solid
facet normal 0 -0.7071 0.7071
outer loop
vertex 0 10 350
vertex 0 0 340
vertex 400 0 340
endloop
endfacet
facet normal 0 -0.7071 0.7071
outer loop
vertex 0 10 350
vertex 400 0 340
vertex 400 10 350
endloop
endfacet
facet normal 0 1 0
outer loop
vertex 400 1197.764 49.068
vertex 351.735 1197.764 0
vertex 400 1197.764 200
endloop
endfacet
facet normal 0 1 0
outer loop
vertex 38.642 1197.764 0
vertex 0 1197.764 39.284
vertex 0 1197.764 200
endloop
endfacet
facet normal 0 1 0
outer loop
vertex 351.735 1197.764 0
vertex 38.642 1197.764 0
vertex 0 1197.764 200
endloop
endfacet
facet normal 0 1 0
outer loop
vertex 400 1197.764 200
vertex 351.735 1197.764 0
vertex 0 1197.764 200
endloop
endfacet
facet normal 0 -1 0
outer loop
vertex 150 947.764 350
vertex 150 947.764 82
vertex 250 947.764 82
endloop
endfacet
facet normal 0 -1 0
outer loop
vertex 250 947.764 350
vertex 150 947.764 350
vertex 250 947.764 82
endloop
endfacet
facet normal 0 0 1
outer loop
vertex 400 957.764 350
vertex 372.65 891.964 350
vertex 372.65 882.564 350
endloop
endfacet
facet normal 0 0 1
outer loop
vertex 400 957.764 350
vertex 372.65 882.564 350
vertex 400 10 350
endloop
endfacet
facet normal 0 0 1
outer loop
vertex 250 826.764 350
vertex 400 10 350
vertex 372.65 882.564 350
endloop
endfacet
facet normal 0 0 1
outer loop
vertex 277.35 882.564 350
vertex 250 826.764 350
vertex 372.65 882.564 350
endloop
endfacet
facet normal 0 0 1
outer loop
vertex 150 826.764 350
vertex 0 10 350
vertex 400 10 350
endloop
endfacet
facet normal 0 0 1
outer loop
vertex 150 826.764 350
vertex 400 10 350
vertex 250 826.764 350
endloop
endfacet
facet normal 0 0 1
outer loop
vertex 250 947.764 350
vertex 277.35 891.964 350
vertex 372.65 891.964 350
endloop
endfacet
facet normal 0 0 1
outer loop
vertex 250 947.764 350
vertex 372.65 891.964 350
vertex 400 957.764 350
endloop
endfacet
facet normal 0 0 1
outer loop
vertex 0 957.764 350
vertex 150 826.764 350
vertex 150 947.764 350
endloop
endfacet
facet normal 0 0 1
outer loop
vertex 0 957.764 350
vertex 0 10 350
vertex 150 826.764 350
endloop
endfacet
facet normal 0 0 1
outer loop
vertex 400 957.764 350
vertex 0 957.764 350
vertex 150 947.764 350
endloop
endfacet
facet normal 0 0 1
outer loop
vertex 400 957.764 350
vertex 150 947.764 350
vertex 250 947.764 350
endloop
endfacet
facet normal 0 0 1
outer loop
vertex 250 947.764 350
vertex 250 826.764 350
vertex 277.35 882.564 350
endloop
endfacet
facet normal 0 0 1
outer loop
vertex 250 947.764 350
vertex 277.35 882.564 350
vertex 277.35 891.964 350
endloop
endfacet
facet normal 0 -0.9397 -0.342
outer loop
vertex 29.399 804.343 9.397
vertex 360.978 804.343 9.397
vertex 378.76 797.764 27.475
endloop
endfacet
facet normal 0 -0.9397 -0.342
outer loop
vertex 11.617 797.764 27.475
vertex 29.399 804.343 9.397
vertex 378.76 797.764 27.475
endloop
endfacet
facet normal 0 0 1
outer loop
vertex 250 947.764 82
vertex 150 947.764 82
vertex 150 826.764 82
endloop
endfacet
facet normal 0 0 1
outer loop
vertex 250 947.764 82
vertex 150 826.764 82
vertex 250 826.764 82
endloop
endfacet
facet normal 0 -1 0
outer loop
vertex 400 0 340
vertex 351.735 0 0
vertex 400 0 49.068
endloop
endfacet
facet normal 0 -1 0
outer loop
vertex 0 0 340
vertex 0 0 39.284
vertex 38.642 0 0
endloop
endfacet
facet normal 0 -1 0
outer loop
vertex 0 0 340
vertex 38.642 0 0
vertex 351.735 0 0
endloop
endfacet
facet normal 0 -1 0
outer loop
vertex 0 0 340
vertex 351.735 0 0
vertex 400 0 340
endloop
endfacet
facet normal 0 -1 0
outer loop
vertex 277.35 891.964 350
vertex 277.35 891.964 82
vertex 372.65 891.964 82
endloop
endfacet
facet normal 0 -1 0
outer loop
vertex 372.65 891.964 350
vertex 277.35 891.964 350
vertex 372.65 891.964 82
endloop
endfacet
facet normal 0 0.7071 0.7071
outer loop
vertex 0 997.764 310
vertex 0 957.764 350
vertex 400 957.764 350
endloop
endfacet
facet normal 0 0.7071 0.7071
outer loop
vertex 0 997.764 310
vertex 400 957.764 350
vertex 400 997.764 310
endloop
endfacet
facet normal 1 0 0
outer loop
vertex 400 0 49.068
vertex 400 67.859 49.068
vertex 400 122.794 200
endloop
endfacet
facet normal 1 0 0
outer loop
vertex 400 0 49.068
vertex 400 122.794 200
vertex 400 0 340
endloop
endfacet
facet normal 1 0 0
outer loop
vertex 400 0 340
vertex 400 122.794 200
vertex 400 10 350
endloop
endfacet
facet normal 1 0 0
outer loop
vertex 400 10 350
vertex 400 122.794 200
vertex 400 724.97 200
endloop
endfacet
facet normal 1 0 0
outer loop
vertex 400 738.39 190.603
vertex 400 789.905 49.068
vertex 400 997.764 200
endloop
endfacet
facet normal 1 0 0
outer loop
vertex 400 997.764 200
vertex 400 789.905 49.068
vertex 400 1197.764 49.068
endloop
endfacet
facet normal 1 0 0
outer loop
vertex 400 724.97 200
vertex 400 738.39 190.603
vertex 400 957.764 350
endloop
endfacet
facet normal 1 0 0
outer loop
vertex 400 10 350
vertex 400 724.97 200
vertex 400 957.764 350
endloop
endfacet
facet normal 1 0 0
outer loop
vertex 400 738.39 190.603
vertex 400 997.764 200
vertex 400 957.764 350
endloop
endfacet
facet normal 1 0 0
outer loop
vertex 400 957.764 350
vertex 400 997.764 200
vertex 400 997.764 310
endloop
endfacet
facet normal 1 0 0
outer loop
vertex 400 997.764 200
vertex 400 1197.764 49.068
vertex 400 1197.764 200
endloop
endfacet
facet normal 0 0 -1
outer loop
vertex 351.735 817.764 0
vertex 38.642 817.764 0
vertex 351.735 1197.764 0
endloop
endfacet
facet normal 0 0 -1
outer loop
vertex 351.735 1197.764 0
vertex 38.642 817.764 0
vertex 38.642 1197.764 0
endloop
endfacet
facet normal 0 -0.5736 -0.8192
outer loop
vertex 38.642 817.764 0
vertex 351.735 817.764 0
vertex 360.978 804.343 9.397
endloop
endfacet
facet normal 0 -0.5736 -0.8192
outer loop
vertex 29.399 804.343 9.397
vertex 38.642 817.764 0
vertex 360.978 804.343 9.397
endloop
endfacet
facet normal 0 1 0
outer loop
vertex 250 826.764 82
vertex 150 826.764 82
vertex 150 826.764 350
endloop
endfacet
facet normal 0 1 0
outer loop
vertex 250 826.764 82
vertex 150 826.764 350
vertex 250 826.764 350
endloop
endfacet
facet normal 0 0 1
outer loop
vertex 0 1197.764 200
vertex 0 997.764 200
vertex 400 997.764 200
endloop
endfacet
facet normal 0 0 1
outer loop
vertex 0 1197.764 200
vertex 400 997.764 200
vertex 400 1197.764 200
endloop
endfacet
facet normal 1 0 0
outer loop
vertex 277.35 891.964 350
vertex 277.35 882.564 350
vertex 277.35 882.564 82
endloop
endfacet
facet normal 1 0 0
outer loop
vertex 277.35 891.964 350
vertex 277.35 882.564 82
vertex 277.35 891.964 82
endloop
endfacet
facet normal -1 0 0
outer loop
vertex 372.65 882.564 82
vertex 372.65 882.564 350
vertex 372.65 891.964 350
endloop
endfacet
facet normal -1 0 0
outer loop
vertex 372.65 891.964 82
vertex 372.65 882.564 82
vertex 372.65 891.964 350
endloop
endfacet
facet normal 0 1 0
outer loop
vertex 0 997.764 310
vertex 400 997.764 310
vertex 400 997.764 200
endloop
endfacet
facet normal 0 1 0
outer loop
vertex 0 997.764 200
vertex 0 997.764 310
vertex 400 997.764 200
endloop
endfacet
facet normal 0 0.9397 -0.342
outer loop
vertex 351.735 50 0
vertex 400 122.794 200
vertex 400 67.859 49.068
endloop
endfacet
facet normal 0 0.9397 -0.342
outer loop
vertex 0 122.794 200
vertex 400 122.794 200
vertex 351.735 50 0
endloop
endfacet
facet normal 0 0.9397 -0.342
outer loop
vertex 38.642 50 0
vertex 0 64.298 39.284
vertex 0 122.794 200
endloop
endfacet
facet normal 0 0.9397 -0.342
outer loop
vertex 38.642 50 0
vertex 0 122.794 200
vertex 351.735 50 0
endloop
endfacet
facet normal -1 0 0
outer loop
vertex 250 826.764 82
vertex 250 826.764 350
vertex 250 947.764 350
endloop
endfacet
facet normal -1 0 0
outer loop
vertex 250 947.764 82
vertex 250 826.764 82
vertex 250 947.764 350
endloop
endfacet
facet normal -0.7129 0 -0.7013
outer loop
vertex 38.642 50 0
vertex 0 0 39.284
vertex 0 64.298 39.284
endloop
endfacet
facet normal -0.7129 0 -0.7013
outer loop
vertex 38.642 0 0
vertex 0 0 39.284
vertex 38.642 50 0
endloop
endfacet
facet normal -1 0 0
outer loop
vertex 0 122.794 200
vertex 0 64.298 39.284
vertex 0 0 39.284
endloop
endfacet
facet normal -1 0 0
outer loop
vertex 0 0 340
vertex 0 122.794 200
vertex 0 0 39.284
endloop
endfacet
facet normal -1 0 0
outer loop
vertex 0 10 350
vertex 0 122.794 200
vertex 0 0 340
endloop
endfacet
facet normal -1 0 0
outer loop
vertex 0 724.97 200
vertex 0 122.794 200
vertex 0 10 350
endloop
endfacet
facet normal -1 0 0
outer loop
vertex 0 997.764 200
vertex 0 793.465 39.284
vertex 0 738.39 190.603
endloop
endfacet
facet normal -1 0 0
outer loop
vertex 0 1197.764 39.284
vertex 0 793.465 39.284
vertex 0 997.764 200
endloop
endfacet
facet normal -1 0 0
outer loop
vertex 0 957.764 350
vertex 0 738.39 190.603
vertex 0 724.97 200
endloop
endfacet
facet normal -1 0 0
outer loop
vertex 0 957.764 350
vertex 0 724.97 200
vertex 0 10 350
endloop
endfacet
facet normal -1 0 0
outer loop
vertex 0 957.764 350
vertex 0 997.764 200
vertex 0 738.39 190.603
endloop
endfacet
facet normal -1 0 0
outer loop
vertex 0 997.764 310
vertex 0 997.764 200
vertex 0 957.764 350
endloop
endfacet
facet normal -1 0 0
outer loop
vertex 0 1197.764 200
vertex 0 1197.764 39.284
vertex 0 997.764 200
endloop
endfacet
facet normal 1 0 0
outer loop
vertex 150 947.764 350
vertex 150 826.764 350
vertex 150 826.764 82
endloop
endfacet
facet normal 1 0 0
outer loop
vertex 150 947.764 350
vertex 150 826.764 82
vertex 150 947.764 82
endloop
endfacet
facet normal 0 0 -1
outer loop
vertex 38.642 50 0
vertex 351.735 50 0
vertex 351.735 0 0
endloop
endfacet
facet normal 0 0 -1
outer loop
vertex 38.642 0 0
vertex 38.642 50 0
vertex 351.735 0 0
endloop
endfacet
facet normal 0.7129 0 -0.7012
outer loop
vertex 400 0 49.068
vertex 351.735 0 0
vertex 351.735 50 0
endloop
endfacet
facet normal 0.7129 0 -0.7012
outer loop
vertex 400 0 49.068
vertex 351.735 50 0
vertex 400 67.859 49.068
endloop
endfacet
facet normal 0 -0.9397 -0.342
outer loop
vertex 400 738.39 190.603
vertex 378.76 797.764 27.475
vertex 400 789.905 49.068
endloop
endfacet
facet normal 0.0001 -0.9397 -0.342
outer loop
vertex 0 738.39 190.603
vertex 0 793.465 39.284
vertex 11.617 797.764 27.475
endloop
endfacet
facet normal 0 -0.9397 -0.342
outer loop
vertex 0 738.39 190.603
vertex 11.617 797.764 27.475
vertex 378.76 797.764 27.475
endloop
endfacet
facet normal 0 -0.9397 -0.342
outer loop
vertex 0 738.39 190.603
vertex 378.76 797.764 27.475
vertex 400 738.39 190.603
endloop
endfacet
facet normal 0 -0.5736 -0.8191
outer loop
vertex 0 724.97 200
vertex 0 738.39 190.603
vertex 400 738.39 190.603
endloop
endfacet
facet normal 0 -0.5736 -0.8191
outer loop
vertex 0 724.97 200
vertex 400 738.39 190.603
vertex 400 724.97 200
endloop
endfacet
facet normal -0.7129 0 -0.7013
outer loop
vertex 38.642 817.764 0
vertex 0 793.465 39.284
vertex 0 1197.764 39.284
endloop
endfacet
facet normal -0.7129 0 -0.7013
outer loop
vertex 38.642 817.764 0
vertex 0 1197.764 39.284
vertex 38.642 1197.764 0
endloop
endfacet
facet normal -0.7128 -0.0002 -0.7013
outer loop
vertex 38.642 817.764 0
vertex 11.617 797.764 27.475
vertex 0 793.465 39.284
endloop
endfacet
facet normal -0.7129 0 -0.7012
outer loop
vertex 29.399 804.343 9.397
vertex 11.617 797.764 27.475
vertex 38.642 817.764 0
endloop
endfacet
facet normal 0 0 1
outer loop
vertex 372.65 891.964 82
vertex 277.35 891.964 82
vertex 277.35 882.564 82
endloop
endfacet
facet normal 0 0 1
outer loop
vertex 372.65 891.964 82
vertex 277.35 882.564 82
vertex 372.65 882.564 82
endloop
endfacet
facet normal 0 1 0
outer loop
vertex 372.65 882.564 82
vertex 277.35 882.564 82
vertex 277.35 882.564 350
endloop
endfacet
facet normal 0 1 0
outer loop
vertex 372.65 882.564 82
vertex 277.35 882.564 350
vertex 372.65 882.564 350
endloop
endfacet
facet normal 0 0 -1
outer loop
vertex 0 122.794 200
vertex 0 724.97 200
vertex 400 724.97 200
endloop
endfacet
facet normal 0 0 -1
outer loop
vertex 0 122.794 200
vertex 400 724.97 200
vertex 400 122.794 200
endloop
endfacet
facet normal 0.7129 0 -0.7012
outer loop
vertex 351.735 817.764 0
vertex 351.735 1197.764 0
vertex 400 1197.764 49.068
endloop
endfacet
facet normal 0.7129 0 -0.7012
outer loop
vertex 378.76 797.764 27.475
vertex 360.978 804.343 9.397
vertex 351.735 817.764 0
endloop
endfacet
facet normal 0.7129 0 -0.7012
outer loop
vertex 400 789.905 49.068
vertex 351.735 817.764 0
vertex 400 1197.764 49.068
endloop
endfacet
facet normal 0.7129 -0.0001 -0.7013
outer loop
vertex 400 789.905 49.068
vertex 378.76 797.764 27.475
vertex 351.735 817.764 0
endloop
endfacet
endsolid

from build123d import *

# Parameters (mm, degrees)
BOSS_EXTRUDE1_DEPTH     = 400
SKETCH2_W               = 100
SKETCH2_H               = 121
SKETCH2_W_2             = 95.3
SKETCH2_H_2             = 9.4
CUT_EXTRUDE1_DEPTH      = 268
CUT_EXTRUDE2_DEPTH      = 1
CUT_EXTRUDE2_DEPTH_BACK = 1198.763658591


with BuildPart() as part:
    # Sketch1 → Boss-Extrude1 (new body)
    with BuildSketch(Plane(origin=(0, 0, 0), x_dir=(0, 0, -1), z_dir=(1, 0, 0))):
        Polygon((0, 0), (-340, 0), (-350, 10), (-350, 957.763658591), (-310, 997.763658591), (-200, 997.763658591), (-200, 1197.763658591), (-150, 1197.763658591), (0, 1197.763658591), (0, 997.763658591), (0, 967.763658591), (0, 817.763658591), (-9.396926208, 804.343457158), (-27.474774195, 797.763658591), (-190.603073792, 738.389813171), (-200, 724.969611738), (-200, 122.794046853), (0, 50), align=None)
    extrude(amount=BOSS_EXTRUDE1_DEPTH)

    # Sketch2 → Cut-Extrude1 (cut)
    with BuildSketch(Plane.XY.offset(350)):
        with Locations((200, 887.263658591)):
            Rectangle(SKETCH2_W, SKETCH2_H)
        with Locations((325, 887.263658591)):
            Rectangle(SKETCH2_W_2, SKETCH2_H_2)
    extrude(amount=-CUT_EXTRUDE1_DEPTH, mode=Mode.SUBTRACT)

    # Sketch3 → Cut-Extrude2 (cut, two sides)
    with BuildSketch(Plane(origin=(0, 0, 0), x_dir=(-1, 0, 0), z_dir=(0, -1, 0))) as cut_extrude2_sk:
        Polygon((32.971910004, -72.804395349), (-67.728153305, 29.569560354), (-322.648629759, 29.569560354), (-423.348693067, -72.804395349), (-423.348693067, 100.069531779), (32.971910004, 100.069531779), align=None)
    extrude(amount=CUT_EXTRUDE2_DEPTH, mode=Mode.SUBTRACT)
    extrude(cut_extrude2_sk.sketch, amount=-CUT_EXTRUDE2_DEPTH_BACK, mode=Mode.SUBTRACT)


solid = part.part
